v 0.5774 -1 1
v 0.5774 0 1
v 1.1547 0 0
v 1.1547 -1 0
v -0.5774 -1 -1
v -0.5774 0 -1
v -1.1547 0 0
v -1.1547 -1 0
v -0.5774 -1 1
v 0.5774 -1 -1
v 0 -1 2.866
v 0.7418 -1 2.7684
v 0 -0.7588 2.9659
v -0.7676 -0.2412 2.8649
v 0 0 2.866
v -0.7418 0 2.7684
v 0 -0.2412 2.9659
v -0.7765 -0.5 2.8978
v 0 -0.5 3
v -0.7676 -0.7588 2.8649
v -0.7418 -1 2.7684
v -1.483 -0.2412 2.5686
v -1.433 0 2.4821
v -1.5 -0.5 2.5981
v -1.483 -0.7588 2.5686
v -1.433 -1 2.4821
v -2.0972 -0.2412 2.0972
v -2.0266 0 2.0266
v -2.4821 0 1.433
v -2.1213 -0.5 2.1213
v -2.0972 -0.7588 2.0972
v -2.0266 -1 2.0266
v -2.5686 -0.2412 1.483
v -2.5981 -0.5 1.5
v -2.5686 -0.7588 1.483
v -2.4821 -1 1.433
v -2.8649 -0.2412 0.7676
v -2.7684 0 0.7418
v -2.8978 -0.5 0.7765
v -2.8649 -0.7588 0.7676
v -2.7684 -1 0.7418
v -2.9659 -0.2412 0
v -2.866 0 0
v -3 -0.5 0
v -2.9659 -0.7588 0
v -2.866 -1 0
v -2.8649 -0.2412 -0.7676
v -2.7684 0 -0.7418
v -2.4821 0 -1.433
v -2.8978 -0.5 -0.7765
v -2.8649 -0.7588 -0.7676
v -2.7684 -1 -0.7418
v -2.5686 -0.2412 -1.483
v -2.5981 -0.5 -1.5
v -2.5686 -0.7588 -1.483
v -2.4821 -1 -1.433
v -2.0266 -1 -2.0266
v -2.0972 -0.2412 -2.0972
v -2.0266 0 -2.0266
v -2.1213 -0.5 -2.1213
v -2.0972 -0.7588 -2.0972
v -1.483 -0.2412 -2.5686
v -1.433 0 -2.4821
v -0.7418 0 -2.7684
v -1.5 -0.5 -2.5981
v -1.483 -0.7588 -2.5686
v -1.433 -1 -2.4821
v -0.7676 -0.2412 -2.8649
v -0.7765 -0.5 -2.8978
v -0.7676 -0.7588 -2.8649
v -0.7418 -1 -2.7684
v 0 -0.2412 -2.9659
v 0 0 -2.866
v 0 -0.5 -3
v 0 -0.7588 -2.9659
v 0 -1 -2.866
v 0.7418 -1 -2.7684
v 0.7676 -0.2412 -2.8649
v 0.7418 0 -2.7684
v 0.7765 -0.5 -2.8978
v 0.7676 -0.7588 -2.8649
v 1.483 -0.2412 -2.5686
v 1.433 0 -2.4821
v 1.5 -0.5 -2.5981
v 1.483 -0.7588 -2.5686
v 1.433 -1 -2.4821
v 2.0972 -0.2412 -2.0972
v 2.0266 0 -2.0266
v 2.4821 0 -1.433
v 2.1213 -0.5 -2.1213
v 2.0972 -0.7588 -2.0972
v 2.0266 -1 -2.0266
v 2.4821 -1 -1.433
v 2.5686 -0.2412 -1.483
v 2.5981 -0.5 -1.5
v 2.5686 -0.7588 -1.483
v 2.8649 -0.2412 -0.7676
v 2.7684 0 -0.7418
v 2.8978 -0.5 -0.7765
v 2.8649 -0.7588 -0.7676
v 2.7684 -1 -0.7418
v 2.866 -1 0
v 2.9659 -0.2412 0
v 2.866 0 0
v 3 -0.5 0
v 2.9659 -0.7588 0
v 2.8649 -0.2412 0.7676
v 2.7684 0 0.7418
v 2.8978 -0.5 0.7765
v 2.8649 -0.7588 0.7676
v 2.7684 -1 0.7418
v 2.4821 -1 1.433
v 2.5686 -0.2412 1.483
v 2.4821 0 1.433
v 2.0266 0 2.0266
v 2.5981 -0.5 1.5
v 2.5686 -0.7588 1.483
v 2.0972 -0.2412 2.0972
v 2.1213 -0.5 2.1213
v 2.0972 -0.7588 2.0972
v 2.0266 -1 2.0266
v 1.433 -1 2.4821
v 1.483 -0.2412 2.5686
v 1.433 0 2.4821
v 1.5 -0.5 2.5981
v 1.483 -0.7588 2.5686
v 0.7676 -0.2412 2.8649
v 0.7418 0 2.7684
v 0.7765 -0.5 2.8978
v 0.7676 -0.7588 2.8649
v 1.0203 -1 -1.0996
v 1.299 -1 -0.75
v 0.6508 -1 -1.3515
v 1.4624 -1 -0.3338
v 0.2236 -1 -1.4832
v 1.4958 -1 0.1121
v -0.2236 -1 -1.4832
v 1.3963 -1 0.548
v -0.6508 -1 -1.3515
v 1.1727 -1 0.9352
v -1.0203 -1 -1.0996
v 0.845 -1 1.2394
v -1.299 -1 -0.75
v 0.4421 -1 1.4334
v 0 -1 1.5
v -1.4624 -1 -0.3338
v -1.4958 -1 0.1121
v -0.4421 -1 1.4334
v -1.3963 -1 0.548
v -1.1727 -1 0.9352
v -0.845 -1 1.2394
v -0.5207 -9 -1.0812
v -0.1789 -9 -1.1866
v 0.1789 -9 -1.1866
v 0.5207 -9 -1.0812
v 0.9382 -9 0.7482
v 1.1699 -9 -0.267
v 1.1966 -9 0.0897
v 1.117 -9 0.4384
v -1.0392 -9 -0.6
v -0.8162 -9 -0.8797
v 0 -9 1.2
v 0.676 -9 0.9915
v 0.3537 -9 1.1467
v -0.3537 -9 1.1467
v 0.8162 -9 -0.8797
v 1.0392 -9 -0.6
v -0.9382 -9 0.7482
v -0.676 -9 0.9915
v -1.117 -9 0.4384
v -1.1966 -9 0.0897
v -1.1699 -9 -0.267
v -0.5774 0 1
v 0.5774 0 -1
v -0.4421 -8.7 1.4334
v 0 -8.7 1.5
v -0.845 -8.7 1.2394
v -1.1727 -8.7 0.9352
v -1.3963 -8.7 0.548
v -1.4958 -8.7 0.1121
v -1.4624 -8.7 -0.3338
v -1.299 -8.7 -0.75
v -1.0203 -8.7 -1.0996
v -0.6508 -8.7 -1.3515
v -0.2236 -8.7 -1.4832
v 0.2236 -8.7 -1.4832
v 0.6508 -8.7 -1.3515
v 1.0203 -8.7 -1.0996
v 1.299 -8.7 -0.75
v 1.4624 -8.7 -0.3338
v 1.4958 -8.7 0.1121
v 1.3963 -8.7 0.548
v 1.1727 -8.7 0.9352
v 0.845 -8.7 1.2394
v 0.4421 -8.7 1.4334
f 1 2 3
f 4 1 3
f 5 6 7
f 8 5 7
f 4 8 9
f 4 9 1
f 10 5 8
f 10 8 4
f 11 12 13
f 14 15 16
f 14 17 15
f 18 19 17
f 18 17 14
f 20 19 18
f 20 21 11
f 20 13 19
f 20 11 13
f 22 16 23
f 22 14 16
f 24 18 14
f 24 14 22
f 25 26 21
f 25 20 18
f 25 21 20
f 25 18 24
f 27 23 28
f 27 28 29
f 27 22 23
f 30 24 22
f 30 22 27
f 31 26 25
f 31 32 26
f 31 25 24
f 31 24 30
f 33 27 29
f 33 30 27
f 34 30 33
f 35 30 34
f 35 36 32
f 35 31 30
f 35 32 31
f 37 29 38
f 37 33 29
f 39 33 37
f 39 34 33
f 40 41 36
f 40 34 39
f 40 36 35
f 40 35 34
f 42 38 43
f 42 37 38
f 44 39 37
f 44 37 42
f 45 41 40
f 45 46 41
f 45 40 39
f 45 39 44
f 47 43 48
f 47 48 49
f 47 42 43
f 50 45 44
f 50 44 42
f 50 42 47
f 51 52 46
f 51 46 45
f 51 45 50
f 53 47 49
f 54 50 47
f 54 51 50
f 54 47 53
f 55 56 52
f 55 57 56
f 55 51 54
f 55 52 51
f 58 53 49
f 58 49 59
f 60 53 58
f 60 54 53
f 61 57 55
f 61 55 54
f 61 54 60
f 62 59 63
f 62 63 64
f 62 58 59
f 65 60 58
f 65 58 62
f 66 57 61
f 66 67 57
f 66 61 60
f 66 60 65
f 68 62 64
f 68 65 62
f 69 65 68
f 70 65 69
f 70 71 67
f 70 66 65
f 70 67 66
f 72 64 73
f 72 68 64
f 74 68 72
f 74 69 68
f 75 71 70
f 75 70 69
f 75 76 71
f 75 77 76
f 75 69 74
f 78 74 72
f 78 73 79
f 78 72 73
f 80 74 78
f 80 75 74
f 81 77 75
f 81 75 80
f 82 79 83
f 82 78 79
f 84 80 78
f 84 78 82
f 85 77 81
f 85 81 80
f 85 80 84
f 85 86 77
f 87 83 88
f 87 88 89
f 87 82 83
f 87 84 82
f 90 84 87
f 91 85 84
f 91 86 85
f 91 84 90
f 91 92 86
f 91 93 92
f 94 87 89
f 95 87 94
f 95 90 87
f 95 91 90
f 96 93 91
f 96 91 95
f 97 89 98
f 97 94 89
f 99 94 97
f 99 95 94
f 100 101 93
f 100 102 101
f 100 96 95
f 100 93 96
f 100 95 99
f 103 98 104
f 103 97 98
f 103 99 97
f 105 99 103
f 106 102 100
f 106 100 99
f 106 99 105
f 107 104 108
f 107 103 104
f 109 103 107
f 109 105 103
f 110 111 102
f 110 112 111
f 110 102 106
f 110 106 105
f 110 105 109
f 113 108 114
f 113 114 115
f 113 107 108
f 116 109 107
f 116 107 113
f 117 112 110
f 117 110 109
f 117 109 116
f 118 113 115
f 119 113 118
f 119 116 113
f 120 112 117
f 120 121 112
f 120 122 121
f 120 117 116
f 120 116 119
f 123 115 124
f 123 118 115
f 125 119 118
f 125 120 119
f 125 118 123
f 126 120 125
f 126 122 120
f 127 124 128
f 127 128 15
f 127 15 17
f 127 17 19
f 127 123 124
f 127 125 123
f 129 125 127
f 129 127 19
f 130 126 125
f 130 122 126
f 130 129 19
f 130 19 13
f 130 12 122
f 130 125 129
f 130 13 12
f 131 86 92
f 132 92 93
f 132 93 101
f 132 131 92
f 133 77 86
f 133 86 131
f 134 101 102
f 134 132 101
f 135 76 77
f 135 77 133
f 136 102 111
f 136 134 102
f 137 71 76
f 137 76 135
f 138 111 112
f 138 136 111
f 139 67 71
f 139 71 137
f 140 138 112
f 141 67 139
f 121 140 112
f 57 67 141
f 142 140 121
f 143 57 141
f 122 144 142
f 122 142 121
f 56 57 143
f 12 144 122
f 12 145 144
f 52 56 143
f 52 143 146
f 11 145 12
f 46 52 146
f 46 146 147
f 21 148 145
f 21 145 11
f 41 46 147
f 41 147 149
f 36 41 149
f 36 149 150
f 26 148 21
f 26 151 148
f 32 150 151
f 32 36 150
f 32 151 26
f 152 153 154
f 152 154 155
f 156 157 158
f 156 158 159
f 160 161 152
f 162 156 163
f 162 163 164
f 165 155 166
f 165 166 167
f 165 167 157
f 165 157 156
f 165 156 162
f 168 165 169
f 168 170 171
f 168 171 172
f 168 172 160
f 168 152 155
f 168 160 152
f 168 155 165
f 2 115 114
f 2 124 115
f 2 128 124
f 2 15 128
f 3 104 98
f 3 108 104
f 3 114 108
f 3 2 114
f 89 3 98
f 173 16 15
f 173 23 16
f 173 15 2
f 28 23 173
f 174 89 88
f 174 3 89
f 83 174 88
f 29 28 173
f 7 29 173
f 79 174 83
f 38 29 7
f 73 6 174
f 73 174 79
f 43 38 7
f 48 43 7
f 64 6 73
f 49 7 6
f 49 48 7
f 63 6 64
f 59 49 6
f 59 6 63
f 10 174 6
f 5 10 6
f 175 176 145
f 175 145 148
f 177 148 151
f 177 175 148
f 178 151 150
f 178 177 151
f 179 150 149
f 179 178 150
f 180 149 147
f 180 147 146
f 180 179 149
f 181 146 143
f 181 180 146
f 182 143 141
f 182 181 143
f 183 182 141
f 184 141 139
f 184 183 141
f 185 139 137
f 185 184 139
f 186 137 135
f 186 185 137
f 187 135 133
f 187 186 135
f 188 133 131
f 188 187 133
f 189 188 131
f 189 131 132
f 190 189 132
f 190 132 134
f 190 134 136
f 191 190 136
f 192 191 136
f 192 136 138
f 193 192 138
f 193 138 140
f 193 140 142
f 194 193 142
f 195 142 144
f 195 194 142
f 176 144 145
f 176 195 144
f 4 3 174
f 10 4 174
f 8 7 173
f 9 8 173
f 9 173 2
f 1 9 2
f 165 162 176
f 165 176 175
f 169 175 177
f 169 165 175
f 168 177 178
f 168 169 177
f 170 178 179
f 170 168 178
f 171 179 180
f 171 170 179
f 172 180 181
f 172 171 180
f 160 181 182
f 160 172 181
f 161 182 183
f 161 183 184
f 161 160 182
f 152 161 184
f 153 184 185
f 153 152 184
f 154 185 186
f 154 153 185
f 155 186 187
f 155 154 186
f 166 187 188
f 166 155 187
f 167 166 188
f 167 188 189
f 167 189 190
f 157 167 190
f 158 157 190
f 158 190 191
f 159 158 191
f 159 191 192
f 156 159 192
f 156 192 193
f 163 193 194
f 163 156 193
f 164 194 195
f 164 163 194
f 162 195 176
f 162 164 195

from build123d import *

# Parameters (mm, degrees)
CHAMFER_1_SIZE      = 0.3
CUT_EXTRUDE_1_DEPTH = 1


with BuildPart() as part:
    # 草图1 → 旋转1 (revolve)
    with BuildSketch(Plane.XY, mode=Mode.PRIVATE) as revolve_1_sk:
        with BuildLine():
            Line((0, 0), (2.866025404, 0))
            ThreePointArc((2.866025404, 0), (3, -0.5), (2.866025404, -1))
            Line((2.866025404, -1), (1.5, -1))
            Line((1.5, -1), (1.5, -9))
            Line((1.5, -9), (0, -9))
            Line((0, -9), (0, 0))
        make_face()
    revolve(revolve_1_sk.sketch.rotate(Axis((0, 0, 0), (0, -1, 0)), 90), axis=Axis((0, 0, 0), (0, -1, 0)))

    # 倒角1
    chamfer_1_edges = [part.edges().sort_by_distance(p)[0] for p in [
        (0, -9, -1.5),
    ]]
    chamfer(chamfer_1_edges, length=CHAMFER_1_SIZE)

    # 草图2 → 切除-拉伸1 (cut)
    with BuildSketch(Plane(origin=(0, 0, 0), x_dir=(1, 0, 0), z_dir=(0, 1, 0))):
        Polygon((1.154700538, 0), (0.577350269, 1), (-0.577350269, 1), (-1.154700538, 0), (-0.577350269, -1), (0.577350269, -1), align=None)
    extrude(amount=-CUT_EXTRUDE_1_DEPTH, mode=Mode.SUBTRACT)


solid = part.part
